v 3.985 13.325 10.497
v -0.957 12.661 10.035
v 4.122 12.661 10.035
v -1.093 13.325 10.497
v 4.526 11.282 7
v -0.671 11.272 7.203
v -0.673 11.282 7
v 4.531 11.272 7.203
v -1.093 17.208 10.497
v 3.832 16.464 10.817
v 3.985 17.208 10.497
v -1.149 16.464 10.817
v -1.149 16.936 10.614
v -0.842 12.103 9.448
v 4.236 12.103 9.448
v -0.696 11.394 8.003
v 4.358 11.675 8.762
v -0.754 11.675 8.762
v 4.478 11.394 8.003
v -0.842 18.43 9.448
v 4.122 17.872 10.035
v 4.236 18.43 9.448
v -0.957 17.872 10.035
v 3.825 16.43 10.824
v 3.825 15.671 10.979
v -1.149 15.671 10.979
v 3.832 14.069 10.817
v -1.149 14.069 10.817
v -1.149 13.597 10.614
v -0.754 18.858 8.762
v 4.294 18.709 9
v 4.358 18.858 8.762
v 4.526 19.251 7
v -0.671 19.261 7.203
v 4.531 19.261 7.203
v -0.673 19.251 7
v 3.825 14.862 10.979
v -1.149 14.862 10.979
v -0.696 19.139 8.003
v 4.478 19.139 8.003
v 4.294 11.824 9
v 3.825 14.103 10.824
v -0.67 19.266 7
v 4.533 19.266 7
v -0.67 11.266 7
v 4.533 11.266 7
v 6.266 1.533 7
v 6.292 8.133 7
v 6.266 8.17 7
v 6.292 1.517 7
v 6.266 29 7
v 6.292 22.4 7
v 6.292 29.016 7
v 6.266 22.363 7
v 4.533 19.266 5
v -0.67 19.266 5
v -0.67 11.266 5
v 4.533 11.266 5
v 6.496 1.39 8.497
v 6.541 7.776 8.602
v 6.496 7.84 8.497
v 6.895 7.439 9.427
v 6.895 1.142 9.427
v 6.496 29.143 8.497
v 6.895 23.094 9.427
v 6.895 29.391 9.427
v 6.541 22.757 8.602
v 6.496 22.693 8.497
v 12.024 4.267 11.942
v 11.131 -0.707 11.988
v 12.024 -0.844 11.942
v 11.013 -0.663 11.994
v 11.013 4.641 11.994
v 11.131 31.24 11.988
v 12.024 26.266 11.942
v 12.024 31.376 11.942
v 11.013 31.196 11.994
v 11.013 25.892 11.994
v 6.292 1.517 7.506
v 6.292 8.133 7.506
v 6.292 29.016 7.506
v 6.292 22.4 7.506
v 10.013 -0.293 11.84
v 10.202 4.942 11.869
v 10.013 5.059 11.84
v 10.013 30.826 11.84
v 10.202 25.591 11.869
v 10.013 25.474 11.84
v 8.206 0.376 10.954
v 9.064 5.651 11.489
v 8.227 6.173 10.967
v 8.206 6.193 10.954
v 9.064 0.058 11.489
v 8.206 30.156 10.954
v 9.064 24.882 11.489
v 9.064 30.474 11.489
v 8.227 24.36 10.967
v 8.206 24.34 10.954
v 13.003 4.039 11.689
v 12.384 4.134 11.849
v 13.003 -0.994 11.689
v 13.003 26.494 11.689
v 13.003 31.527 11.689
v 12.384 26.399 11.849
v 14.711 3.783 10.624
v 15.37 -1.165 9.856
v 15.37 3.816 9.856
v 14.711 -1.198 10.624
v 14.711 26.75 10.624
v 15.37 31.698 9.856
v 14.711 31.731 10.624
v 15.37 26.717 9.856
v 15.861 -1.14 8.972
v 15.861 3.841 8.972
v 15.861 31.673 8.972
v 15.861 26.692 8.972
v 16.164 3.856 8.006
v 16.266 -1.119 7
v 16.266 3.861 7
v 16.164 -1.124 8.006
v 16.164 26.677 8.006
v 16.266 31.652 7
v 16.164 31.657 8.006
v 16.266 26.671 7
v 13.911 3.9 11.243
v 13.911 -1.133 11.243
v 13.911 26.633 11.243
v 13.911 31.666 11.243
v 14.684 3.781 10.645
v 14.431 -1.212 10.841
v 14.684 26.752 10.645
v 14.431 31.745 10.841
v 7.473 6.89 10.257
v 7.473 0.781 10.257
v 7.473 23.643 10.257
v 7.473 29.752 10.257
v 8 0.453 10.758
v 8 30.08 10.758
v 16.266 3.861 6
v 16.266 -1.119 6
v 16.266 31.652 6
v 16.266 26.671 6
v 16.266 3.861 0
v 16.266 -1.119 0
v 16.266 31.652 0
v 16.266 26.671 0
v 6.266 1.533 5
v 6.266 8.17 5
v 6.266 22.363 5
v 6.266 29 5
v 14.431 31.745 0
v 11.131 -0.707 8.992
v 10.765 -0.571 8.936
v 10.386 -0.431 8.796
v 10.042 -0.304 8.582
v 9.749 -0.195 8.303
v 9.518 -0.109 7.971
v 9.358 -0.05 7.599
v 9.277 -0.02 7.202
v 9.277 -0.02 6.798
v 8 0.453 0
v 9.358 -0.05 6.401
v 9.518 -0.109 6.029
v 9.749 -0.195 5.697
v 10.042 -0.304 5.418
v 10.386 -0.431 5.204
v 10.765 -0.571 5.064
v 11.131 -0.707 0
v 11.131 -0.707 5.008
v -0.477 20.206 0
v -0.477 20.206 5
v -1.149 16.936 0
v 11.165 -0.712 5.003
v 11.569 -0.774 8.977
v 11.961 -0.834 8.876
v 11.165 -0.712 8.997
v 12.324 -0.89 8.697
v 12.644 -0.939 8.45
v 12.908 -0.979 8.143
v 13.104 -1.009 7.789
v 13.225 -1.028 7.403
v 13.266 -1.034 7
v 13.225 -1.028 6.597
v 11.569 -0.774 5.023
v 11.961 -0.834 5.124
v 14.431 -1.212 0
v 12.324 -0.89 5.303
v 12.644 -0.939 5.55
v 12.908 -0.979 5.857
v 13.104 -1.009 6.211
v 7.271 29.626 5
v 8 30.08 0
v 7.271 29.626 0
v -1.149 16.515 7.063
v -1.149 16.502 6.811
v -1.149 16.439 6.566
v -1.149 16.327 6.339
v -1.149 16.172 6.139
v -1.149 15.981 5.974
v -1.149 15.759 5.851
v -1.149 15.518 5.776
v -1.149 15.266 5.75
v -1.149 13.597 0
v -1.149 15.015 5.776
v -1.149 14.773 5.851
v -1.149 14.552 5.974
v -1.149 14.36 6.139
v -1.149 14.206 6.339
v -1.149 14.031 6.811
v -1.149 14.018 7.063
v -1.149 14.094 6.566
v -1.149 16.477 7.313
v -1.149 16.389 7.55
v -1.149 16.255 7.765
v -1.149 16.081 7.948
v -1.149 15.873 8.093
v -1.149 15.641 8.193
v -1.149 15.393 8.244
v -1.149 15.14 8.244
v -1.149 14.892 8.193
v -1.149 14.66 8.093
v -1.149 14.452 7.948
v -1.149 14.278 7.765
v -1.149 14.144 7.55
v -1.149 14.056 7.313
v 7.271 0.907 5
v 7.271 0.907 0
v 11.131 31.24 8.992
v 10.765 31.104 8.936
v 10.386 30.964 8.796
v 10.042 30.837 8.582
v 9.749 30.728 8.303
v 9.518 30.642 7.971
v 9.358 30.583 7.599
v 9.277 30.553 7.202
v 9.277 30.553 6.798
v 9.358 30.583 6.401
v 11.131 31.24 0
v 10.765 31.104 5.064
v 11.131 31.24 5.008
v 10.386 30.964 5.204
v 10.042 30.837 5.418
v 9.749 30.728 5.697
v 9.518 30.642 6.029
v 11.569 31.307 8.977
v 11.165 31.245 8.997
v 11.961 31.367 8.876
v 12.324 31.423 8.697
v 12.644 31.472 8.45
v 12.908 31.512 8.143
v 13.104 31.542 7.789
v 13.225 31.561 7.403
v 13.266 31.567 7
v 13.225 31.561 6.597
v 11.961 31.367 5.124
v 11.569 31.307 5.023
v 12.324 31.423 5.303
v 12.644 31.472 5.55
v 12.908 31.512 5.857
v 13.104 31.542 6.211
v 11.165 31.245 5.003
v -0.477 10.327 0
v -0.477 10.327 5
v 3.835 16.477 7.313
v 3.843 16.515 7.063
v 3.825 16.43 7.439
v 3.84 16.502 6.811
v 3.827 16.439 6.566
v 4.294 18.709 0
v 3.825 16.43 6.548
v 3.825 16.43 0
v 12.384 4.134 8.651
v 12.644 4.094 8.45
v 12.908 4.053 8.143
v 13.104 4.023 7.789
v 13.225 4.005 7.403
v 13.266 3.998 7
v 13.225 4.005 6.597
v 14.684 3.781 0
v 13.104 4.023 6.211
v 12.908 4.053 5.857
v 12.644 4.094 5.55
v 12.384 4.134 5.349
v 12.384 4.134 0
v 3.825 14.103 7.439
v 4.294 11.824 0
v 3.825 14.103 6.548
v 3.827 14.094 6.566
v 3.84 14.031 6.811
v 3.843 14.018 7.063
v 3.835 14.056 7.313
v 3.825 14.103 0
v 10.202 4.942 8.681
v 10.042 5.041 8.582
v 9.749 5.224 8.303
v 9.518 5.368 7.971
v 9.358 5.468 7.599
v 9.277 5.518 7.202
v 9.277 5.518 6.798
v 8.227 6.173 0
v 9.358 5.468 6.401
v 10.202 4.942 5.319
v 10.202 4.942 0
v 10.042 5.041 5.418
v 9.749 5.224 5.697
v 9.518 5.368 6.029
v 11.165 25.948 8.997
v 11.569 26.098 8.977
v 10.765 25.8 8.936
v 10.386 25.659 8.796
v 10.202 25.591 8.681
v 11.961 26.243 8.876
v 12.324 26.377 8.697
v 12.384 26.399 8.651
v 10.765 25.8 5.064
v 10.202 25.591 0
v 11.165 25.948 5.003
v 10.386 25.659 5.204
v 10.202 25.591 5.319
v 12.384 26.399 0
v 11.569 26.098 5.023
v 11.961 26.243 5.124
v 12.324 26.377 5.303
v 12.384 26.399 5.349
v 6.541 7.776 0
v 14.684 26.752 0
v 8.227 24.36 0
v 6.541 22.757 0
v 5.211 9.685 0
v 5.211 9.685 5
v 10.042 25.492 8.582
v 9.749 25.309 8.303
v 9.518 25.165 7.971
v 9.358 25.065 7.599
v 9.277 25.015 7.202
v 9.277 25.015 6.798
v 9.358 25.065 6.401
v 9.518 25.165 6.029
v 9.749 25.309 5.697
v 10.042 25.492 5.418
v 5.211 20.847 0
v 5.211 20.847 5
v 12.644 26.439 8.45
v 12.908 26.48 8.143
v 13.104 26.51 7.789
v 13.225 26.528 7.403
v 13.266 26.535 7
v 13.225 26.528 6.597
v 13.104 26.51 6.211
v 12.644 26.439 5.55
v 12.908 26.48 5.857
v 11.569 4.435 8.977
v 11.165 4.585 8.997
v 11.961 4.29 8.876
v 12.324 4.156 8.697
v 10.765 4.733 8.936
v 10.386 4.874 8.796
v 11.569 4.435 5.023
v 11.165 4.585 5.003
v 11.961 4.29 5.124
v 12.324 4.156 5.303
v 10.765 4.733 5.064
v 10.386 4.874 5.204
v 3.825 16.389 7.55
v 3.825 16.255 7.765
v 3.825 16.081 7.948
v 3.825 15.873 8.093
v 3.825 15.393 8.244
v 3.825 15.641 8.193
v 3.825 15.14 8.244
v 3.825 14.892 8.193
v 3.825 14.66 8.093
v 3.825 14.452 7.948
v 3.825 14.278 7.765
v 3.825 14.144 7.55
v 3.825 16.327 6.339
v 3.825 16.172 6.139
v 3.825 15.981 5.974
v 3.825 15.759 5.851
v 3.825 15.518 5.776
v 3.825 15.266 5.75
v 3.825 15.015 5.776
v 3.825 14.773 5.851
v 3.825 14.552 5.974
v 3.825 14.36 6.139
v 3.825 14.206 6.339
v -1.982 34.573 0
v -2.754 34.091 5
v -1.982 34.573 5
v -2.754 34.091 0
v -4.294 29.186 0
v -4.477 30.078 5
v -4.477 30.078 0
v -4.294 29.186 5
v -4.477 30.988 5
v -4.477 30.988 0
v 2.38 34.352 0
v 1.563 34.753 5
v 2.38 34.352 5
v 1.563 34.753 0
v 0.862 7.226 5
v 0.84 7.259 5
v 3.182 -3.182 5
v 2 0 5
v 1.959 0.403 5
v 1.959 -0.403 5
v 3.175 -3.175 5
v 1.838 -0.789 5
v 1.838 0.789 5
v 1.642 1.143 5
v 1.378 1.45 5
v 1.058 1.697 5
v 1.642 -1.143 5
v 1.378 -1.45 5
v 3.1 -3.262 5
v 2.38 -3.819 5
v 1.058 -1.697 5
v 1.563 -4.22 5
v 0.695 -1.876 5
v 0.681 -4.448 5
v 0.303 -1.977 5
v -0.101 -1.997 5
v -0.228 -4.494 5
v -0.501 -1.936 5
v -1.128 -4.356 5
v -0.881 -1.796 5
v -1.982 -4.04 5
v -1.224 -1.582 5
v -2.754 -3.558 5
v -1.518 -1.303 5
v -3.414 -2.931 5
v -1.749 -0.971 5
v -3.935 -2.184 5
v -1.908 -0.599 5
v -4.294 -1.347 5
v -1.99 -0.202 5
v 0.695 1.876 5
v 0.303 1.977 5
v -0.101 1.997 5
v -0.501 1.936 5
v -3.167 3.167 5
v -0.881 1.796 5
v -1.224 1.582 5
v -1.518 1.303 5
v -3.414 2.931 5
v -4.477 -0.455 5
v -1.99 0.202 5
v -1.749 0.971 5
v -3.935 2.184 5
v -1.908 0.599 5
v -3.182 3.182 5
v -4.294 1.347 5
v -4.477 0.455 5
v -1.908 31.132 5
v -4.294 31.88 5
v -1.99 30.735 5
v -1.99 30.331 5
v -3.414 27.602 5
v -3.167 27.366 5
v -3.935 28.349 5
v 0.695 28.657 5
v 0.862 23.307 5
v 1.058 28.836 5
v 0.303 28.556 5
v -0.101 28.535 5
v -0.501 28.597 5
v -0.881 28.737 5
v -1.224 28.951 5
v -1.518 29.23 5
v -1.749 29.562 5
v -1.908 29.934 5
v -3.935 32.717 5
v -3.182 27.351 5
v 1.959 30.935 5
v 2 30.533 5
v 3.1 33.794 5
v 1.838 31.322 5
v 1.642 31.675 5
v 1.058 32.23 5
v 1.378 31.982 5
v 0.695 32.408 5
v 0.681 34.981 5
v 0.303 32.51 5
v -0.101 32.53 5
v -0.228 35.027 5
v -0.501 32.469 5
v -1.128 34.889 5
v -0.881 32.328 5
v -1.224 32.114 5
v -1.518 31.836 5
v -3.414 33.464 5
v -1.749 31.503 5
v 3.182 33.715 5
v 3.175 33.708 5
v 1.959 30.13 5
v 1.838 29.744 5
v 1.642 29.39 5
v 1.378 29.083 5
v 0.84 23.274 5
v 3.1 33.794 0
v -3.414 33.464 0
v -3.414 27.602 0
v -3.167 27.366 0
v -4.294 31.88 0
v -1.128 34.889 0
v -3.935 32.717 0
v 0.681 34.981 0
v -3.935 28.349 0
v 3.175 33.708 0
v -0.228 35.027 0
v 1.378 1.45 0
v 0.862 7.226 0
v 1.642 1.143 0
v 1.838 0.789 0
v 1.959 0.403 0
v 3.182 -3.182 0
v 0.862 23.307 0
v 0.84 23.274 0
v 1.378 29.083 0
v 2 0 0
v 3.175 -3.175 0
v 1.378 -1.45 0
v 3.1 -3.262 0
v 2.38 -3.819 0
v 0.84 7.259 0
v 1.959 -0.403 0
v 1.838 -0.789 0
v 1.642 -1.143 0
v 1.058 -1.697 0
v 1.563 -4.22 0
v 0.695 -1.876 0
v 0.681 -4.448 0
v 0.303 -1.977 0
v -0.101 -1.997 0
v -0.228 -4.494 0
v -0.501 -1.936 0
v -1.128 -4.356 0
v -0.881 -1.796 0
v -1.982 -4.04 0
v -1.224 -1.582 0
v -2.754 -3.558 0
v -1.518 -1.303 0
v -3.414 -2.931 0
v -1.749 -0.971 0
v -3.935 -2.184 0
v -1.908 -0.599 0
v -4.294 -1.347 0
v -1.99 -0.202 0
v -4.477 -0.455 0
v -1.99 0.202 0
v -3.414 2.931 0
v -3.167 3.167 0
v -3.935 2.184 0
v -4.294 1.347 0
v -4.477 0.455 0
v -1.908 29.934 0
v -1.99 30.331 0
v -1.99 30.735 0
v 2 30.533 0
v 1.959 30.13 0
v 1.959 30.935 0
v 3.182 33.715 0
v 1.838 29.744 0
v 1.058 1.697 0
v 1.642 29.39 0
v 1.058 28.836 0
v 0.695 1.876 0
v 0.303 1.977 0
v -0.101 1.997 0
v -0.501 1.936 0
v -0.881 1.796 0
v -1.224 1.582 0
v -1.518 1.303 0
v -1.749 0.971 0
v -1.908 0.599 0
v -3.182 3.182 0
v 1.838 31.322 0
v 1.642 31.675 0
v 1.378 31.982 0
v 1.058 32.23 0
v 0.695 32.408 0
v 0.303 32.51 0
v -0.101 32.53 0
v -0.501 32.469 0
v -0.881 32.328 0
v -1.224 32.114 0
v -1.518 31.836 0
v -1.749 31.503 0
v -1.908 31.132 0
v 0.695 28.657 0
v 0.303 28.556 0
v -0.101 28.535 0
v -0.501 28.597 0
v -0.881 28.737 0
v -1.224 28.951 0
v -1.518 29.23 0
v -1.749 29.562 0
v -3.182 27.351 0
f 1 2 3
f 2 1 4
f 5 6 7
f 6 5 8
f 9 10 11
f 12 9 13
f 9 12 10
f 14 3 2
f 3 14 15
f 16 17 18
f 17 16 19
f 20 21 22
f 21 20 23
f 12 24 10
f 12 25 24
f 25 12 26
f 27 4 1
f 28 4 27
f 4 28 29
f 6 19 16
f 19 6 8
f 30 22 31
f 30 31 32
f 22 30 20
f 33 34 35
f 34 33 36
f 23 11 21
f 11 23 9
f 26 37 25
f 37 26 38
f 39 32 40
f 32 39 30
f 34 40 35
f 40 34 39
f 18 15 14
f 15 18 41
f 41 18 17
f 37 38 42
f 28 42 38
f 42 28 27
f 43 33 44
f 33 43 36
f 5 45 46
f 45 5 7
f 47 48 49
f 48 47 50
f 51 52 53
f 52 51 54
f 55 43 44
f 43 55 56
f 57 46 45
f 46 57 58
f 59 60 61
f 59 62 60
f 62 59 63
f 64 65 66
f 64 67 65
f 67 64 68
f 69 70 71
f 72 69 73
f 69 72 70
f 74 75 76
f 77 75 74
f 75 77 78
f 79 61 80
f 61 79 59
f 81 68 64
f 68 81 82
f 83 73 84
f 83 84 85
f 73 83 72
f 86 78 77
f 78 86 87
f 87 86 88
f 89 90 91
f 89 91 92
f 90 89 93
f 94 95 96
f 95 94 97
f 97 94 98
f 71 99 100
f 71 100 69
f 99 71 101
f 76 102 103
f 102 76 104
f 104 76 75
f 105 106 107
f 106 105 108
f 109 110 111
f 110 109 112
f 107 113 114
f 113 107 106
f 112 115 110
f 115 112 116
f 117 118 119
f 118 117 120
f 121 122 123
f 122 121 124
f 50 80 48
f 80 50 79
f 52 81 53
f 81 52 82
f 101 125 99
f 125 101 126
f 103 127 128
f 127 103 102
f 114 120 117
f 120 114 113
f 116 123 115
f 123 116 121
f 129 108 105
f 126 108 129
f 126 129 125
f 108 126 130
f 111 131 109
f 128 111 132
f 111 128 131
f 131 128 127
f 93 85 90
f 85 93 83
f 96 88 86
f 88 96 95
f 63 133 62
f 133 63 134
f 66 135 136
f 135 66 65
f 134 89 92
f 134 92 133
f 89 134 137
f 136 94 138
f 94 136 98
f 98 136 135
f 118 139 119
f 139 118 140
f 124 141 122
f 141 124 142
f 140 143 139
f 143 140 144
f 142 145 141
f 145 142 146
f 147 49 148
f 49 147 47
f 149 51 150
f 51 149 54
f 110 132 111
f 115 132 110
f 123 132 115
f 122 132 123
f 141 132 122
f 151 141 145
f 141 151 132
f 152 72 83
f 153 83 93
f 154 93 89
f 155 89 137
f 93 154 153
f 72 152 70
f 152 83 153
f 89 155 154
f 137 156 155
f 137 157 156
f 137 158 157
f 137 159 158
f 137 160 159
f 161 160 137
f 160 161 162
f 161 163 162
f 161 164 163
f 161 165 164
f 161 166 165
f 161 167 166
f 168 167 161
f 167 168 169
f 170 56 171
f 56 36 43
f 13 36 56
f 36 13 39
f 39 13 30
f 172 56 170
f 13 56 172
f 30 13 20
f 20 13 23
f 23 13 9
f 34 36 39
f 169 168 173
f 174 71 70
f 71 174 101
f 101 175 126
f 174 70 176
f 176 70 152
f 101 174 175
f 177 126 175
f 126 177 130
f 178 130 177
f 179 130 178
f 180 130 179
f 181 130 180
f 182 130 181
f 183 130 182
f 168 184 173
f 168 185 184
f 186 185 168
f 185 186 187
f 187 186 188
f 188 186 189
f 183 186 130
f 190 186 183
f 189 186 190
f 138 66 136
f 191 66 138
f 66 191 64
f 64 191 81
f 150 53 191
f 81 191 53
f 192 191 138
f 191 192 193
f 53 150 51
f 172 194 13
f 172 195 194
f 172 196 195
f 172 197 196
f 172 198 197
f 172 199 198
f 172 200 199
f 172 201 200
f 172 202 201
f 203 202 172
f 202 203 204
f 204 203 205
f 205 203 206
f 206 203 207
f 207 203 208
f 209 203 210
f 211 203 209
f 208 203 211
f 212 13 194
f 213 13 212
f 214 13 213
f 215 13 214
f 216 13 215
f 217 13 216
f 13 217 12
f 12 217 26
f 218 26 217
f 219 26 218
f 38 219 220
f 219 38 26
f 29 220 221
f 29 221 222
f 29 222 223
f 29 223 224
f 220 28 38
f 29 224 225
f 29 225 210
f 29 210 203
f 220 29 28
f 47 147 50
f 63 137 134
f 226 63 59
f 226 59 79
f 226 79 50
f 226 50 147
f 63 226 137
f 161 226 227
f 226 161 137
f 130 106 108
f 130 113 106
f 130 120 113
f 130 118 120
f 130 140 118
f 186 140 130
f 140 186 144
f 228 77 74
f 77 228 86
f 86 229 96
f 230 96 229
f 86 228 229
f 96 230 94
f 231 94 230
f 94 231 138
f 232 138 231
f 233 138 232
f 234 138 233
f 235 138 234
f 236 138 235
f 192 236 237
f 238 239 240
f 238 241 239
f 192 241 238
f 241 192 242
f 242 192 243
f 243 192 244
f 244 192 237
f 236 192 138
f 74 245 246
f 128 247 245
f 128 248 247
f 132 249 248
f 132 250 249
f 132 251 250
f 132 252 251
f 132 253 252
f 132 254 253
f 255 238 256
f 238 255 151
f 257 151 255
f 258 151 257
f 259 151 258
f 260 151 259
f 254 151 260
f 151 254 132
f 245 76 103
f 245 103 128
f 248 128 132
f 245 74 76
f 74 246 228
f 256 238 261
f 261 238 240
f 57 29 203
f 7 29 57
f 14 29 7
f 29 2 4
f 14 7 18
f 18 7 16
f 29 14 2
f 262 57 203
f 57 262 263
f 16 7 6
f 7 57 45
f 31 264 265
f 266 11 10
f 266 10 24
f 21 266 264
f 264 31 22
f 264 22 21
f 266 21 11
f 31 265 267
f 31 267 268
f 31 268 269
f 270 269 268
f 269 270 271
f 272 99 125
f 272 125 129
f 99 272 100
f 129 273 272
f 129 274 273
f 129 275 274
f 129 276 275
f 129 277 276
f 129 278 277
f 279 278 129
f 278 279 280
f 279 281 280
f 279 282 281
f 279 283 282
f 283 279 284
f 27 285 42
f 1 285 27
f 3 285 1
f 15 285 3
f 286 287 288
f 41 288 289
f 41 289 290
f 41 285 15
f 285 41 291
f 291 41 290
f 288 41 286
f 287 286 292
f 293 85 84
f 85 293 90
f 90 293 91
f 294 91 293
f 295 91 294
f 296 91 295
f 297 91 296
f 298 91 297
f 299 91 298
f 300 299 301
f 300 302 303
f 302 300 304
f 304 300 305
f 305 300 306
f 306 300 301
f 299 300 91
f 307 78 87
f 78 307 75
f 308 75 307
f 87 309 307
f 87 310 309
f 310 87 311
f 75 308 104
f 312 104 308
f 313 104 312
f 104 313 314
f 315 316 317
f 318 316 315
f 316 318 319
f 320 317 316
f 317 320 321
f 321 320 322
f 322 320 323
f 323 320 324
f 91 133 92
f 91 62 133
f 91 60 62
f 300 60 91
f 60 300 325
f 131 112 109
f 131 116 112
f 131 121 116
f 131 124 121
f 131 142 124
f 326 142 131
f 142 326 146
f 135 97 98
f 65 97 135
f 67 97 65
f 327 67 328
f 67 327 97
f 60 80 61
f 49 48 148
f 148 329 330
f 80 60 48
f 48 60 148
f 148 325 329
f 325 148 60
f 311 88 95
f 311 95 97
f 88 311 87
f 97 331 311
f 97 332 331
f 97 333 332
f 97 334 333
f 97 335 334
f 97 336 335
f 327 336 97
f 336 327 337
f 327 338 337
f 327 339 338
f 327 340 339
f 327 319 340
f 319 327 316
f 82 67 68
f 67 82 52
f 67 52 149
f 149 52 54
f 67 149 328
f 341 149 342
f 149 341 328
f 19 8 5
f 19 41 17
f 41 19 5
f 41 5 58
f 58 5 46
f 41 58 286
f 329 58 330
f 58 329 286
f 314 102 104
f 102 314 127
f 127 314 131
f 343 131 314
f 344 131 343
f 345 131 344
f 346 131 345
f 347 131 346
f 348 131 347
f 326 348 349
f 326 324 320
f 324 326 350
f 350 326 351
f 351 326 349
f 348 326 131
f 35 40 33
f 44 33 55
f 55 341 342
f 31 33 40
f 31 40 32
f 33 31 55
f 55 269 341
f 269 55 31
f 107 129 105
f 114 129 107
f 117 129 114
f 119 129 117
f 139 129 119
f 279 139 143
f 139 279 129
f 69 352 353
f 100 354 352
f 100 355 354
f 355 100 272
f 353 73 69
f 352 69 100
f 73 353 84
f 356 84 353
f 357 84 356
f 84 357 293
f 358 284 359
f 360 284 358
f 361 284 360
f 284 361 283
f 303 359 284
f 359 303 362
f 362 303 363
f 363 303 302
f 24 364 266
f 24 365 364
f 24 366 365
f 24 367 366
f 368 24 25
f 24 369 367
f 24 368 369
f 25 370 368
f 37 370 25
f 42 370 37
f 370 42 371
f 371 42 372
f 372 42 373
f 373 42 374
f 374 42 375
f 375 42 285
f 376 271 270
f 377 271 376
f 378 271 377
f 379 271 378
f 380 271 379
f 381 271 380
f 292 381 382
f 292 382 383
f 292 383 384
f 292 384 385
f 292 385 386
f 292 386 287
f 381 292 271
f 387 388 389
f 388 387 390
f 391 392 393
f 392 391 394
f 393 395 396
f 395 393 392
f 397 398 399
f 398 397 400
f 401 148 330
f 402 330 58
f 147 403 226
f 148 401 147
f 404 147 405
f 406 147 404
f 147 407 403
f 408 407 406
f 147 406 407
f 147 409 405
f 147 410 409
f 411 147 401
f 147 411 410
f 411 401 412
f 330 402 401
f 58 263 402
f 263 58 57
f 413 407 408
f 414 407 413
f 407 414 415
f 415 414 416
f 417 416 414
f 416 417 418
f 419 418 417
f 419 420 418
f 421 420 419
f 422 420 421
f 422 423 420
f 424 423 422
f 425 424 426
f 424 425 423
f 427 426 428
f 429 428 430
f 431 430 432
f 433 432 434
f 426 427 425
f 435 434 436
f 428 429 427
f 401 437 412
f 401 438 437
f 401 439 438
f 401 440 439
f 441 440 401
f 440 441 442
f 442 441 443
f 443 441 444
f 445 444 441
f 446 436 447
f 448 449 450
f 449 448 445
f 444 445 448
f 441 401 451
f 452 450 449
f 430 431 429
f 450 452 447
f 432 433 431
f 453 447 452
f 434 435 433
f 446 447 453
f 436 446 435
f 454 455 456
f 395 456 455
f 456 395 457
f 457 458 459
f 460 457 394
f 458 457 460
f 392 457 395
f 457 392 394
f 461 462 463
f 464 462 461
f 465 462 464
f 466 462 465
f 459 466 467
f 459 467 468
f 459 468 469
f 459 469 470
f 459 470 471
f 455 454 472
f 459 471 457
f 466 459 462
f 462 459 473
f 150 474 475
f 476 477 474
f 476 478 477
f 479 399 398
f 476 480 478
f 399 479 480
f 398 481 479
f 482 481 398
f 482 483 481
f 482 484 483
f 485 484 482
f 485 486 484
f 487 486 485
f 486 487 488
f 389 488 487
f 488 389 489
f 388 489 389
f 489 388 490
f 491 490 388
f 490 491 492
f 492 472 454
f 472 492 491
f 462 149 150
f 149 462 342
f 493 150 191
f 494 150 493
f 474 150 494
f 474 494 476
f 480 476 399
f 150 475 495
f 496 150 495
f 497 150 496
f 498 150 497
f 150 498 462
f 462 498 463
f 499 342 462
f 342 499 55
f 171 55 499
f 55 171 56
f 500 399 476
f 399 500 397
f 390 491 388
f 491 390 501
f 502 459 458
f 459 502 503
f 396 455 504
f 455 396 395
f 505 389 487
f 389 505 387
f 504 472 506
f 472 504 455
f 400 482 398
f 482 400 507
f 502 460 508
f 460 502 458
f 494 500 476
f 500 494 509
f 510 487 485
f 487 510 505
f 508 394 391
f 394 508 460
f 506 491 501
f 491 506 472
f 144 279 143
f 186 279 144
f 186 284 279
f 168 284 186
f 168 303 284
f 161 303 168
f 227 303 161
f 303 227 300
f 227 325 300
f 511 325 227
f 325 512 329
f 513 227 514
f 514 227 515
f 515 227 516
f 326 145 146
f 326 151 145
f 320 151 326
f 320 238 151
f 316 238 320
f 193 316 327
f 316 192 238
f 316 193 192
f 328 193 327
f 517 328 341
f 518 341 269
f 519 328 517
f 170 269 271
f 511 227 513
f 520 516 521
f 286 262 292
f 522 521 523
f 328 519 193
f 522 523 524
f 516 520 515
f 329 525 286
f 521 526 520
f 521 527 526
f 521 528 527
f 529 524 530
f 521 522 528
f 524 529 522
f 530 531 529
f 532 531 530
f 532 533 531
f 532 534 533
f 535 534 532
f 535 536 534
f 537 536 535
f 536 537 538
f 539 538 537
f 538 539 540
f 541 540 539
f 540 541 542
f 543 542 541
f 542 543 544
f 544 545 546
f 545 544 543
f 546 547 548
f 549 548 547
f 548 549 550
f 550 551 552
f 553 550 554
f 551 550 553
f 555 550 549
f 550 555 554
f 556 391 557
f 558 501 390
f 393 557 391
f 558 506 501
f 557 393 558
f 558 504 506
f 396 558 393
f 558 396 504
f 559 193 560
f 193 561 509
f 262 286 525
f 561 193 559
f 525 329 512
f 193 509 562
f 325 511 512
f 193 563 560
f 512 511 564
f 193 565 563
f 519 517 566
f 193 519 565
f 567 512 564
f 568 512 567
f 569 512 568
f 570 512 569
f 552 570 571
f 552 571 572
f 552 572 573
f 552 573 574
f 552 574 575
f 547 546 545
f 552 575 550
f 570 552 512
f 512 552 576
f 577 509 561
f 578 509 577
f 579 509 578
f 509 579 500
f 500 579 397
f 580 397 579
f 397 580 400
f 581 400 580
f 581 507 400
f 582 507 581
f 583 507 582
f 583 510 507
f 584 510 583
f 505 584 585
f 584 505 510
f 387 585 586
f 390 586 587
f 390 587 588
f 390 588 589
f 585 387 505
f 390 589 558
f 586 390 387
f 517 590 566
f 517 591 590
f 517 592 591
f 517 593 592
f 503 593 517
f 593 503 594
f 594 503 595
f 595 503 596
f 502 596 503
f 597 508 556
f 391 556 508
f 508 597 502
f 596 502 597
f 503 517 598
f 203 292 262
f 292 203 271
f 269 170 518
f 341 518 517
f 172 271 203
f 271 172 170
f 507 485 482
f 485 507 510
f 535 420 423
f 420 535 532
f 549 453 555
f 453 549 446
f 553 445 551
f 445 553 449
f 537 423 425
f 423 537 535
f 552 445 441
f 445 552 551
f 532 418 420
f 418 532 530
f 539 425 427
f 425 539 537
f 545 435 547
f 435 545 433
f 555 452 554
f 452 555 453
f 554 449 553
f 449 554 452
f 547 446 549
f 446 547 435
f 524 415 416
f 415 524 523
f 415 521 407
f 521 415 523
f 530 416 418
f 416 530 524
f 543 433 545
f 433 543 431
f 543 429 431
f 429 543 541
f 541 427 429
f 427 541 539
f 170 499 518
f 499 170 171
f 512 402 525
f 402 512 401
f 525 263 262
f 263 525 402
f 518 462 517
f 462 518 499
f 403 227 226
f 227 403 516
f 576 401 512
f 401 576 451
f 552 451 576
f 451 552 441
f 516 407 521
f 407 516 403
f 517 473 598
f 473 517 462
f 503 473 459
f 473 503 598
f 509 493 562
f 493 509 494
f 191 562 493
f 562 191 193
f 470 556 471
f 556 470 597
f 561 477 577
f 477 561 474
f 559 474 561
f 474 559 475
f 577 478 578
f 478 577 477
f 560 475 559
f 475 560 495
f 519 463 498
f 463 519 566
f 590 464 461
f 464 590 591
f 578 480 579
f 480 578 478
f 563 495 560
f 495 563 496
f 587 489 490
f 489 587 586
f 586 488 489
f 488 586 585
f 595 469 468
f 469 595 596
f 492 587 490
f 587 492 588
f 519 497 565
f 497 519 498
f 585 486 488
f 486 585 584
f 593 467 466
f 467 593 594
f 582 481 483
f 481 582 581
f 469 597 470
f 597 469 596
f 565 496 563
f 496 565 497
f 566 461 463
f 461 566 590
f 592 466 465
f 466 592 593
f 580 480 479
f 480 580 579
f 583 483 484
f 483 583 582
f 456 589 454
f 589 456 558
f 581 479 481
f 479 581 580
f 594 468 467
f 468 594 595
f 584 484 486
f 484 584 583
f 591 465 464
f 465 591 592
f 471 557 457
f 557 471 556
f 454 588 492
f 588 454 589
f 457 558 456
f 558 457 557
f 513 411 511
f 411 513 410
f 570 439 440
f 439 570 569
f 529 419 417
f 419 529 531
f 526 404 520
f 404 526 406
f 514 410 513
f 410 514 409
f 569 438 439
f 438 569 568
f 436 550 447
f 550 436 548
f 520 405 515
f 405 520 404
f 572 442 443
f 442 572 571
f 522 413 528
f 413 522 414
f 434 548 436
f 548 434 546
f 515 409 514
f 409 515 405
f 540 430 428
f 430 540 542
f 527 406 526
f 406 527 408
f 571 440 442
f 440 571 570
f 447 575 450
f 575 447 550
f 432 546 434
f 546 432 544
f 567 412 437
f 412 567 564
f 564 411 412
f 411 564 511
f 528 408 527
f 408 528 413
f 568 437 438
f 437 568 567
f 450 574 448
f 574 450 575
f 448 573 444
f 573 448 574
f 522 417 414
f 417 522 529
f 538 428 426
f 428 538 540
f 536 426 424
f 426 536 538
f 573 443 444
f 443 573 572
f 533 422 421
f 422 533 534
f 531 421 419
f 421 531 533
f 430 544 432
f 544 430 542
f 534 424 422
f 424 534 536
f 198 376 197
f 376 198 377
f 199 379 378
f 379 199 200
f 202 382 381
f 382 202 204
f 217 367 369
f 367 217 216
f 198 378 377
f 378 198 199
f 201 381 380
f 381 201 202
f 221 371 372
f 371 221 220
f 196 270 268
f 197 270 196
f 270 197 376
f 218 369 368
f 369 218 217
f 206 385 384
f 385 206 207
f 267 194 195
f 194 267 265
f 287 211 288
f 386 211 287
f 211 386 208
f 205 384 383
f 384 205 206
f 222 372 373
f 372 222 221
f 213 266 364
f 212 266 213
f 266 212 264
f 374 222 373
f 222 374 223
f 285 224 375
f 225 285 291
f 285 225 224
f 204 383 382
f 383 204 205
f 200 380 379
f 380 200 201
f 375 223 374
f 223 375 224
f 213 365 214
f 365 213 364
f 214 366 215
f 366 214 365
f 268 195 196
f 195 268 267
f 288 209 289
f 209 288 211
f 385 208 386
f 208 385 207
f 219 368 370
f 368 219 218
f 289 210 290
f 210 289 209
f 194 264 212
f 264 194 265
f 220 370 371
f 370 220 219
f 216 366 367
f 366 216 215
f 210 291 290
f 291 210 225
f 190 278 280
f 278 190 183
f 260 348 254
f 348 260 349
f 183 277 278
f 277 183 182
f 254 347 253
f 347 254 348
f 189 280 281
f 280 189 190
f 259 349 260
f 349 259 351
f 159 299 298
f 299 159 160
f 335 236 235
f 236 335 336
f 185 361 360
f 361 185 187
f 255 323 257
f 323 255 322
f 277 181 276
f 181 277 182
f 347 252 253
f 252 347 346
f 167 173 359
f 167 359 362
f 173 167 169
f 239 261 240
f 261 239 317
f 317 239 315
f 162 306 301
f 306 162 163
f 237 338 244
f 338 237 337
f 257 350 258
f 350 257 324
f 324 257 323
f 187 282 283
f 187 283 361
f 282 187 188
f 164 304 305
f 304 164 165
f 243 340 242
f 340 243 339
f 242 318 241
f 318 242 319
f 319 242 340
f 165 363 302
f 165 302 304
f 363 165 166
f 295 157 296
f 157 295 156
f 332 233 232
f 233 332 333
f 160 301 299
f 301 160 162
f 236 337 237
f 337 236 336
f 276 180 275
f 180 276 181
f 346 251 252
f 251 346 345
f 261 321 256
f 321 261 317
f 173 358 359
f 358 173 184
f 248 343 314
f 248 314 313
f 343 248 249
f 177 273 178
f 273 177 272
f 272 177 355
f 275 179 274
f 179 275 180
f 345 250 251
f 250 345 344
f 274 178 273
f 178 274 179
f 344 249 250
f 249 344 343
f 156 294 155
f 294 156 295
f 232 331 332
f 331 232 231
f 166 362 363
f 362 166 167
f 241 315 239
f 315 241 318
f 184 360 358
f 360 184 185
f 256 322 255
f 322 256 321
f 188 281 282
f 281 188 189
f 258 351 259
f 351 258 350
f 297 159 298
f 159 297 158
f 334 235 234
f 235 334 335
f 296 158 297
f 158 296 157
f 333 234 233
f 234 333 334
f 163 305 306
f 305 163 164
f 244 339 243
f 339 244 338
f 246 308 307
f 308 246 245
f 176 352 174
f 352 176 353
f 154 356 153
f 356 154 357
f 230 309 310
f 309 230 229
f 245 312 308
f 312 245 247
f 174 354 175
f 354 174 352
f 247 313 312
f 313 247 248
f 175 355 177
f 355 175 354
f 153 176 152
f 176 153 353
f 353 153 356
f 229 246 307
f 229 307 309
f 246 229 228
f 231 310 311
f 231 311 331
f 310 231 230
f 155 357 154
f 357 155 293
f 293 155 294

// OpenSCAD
// file: ../config.scad
// This is the config for an M8 Mendel sized printer.

//Constants (These are used throughout the whole printer)
frameroddia = 8.5; //the frame rod diameter
smoothroddia = 8.5; //the smooth rod diameter
bushingod = 16; //The prusabushing OD, you can change this to 15 to use LM8UU linear bearings 
bushingheight = 11;
tapsize = 7; //The size of the hole before tapping. 7mm seems to work well.

nemasize = 1.7; //Nema Size (in imperial)
motorcenter = 23; //center hole size for the motor. If your motor center flange is smaller you can beef up parts this way. 
motorshaftdia = 5; // Motor shaft diameter
motorcenterwall = 5;
motorbody = 43;

pulleypitch = 5;
pulleyteeth = 8;
pulleydia = 12; // this will be replaced by the above soon

/* The Mixtape Mendel uses two types of fasteners. One is the "primary" type, which is the larger type that builds the structure,
 which was profiled above as "frameroddia, etc..". In the case of the Mendel, it is M8 threaded rod (Huxley, M6). It also uses "Secondary" hardware. This is a smaller screw used to retain tool heads, attach motors and lock pulleys on shafts. In the case of Mendel this is M3 or M4. M3 is preferred as it is cheaper. Tapping is quite the challenge though. 
*/
nutheight = 7; //Primary
nutdia = 14.8; //Primary
secscrewdia = 4; //secondary 
secscrewtap = 2.5; // secondary

beltthick = 2; //Thickness of the timing belt
beltwidth = 7; // Belt width, used for the y bed clamps so can be a little bugger than actual

mdfthick = 6; //thickness of MDF (You can use other wood, acrylic, lexan, etc)

bearingid = 8; // 608
bearingod = 22; // 608
bearinginnerrace = 12; // the amount of the inner race diameter exposed

tapping = true; //turn tapping on/off, not implemented yet. (Version 0.3 might implement this) Version 0.2 has tapping by default right now
layerheight = 0.32; //skeinforge/slicer layer height, used for the idler wasers right now. 

//Beef/tab/wall
motortabwall = 2.5;

//Frame Vertex
vertexwall = 3;
triangle = 60; // the angle the bottom vertexes have relative to horizontal

//Y Motor Mount
ymountthick = 9;
ywallmulti = 2; //the wall thickness multiplier for the bits that interface with the frame rod

//Y Belt Clamps
clampholewall = 3;
	//(bushingod-pulleydia)/2

//Bar Clamps
barclampwall = 4;

//Top Piece
toppiecethick = 8;
toprodwall = 4;
toprodspacing = 72;
siderodwall = 4;

// X End Pieces
xrodspacing = 50; //rod spacing center to center
nutwall = 3; //wall thickness around nut and bushing
towergap= 10; // 0.75 diameter wrap should be ok i think. Make a flag for full wrap and no square for bushings/linear bearings maybe?
//Motor
motorinterface = 6; //thickness of the motor mount (6 works well, need to decouple from top piece)

//X Carriage 
carriagewidth = 50;
bushingwall = 3;
backwall = 5;
tooldia = 17;
platformthick = 7;
platformextension = 40; 
clampthick = 4; //The two pieces that clamp around the belt

//Z Coupler
couplerwall = 4;
couplerheight = 34; // Make this double 3/4 your shaft length
 
//Extruder (Plastic Pusher)
extruderthick = 5;
bowdencabledia = 4;
bowdenwall = 3;
idlerwall = 2;
pinchwheeldia = 8;

//Utility Clamp 
utilityclampwall = 3;

//Groove Mount
	//Default is pretty good for MakerGear insulators
groovedia = 12;
grooveheight = 4.5;

//pen holder 
penwall = 3 ;
shaftheight = 30;
// main file
/*
  Mixtape Mendel - A Fully Parametric RepRap
    Copyright (C) 2011  Steve Kelly

    This program is free software: you can redistribute it and/or modify
    it under the terms of the GNU General Public License as published by
    the Free Software Foundation, either version 3 of the License, or
    (at your option) any later version.

    This program is distributed in the hope that it will be useful,
    but WITHOUT ANY WARRANTY; without even the implied warranty of
    MERCHANTABILITY or FITNESS FOR A PARTICULAR PURPOSE.  See the
    GNU General Public License for more details.

    You should have received a copy of the GNU General Public License
    along with this program.  If not, see <http://www.gnu.org/licenses/>.
*/

include <../config.scad>;
$fn = 31;

difference(){
union(){

		//motor construction
		translate([0,nemasize*2.54*sin(45)*10,0])cylinder(r=secscrewdia/2+motortabwall, h=extruderthick);
		translate([0,0,0])cylinder(r=secscrewdia/2+motortabwall, h=extruderthick);
		translate([nemasize*2.54*sin(45)*5,nemasize*2.54*sin(45)*5,0])cylinder(r=motorcenter/2+motorcenterwall, h=extruderthick); //motorcenter
		translate([-(secscrewdia/2+motortabwall)*sin(45),(secscrewdia/2+motortabwall)*sin(45),0])rotate([0,0,-45])cube([secscrewdia+motortabwall*2,nemasize*2.54*5,extruderthick]);
		translate([nemasize*2.54*sin(45)*10-((secscrewdia/2+motortabwall)*sin(45)),-(secscrewdia/2+motortabwall)*sin(45),0])rotate([0,0,45])translate([0,nemasize*2.54*5,0])cube([secscrewdia+motortabwall*2,nemasize*2.54*5,extruderthick]);
		

		intersection(){
			union(){
			translate([-secscrewdia,nemasize*2.54*sin(45)*5,extruderthick+secscrewdia/2])rotate([0,90,0])cylinder(r=secscrewdia/2+idlerwall, h=nemasize*2.54*sin(45)*5); //idler hole
			translate([-secscrewdia,nemasize*2.54*sin(45)*5-idlerwall-secscrewdia/2,extruderthick-idlerwall])cube([nemasize*2.54*sin(45)*5,secscrewdia+idlerwall*2,secscrewdia/2+idlerwall]);
			translate([nemasize*2.54*sin(45)*5-pinchwheeldia/2,-secscrewdia,extruderthick+bowdencabledia/2])rotate([-90,0,0])cylinder(r=bowdencabledia/2+bowdenwall, h=nemasize*2.54*sin(45)*10+secscrewdia*2);
			translate([nemasize*2.54*sin(45)*5-pinchwheeldia/2-bowdencabledia/2-bowdenwall,-secscrewdia,extruderthick-bowdenwall])cube([bowdencabledia+bowdenwall*2,nemasize*2.54*sin(45)*10+secscrewdia*2,bowdencabledia/2+bowdenwall]);

			}
				difference(){
					translate([nemasize*2.54*sin(45)*5,nemasize*2.54*sin(45)*5,0])cylinder(r=motorcenter/2+motorcenterwall, h=extruderthick+bowdencabledia+bowdenwall); //motorcenter
					translate([nemasize*2.54*sin(45)*5,nemasize*2.54*sin(45)*5,0])cylinder(r=motorcenter/2, h=extruderthick+bowdencabledia+bowdenwall); //motorcenter
				}	
		}
	
	
}

	
		//motor screws
		translate([0,nemasize*2.54*sin(45)*10,0])cylinder(r=secscrewdia/2, h=extruderthick);
		translate([0,0,0])cylinder(r=secscrewdia/2, h=extruderthick);
		translate([nemasize*2.54*sin(45)*5,nemasize*2.54*sin(45)*5,0])cylinder(r=motorcenter/2, h=extruderthick); //motorcenter

		translate([-secscrewdia,nemasize*2.54*sin(45)*5,extruderthick+secscrewdia/2])rotate([0,90,0])cylinder(r=secscrewtap/2, h=nemasize*2.54*sin(45)*5); //idler hole
		translate([nemasize*2.54*sin(45)*5-pinchwheeldia/2,-secscrewdia,extruderthick+bowdencabledia/2])rotate([-90,0,0])cylinder(r=bowdencabledia/2, h=nemasize*2.54*sin(45)*10+secscrewdia*2);

		translate([nemasize*2.54*sin(45)*5-pinchwheeldia/2+bowdencabledia/2+bowdenwall,-secscrewdia,-1])cube([nemasize*2.54*sin(45)*10,nemasize*2.54*sin(45)*10+secscrewdia*2,extruderthick+2]);
}
